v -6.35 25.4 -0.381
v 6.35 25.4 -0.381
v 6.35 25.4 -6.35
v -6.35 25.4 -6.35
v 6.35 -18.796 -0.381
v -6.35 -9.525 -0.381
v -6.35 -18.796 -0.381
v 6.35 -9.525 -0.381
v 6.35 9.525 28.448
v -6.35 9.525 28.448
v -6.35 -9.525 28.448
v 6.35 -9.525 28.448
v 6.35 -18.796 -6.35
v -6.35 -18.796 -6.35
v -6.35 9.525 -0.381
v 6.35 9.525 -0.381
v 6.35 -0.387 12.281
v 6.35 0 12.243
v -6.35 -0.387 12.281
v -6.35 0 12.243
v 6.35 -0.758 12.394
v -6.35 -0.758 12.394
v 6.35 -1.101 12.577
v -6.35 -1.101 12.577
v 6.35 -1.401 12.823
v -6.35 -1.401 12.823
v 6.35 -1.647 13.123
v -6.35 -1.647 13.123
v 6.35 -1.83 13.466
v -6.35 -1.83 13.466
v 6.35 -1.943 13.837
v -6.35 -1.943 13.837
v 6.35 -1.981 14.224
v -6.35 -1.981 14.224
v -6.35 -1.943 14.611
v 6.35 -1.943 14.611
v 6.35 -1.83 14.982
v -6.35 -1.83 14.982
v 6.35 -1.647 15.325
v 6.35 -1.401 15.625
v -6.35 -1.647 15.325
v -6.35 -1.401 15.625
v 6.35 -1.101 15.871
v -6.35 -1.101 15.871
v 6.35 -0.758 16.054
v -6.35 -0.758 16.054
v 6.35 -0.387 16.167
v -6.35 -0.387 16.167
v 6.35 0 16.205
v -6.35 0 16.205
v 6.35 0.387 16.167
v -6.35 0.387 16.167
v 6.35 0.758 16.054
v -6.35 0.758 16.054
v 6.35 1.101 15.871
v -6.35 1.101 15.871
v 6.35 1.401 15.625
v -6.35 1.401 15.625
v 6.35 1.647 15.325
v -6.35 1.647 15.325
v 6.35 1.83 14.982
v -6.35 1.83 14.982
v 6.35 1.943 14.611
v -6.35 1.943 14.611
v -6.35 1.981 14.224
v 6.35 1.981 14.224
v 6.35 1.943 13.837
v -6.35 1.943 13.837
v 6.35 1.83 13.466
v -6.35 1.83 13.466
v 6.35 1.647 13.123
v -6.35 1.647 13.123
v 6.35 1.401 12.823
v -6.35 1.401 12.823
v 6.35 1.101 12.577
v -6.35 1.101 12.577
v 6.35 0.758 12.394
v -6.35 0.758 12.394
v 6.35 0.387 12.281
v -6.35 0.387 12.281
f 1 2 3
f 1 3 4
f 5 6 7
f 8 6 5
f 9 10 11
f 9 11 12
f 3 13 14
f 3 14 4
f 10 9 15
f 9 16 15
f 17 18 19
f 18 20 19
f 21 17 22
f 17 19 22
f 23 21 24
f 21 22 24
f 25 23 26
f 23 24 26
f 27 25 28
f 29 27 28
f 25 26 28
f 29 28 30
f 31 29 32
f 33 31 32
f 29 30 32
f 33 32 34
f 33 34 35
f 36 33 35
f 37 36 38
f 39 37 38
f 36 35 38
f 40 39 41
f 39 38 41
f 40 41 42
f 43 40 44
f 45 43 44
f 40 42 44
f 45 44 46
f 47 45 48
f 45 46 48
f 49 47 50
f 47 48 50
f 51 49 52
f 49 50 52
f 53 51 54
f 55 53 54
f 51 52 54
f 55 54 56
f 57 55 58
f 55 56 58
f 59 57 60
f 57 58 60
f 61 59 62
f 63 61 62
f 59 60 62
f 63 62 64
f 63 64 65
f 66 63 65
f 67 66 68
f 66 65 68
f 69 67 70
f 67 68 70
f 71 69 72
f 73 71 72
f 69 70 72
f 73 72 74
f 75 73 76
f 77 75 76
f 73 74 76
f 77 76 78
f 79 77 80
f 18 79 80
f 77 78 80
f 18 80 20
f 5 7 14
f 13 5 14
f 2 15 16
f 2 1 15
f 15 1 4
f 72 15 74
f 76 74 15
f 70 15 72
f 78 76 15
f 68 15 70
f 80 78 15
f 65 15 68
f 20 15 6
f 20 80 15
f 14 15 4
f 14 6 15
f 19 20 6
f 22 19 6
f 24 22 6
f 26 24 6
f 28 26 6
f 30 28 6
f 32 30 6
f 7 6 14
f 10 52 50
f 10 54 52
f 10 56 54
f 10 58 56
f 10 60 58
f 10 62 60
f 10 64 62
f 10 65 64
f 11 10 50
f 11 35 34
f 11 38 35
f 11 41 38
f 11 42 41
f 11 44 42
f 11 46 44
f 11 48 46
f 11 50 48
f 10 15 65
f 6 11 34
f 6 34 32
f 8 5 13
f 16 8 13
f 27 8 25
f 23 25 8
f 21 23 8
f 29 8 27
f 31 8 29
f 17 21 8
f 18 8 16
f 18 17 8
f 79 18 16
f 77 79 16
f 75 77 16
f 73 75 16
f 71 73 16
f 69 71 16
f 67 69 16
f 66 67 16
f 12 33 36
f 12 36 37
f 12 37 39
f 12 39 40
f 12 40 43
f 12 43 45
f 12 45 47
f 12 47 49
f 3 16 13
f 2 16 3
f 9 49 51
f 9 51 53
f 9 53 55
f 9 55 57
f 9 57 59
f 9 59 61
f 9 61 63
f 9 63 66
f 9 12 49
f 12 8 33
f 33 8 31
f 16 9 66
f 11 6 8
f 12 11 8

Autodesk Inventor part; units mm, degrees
ref_plane "YZ Plane" through (0, 0, 0) normal (1, 0, 0) x (0, 1, 0)
ref_plane "XZ Plane" through (0, 0, 0) normal (0, 1, 0) x (-1, 0, 0)
ref_plane "XY Plane" through (0, 0, 0) normal (0, 0, 1) x (1, 0, 0)
sketch "Sketch1" plane through (0, 0, 0) normal (0, 0, 1) x (1, 0, 0)
  line L0 (-6.35, -25.4) -> (6.35, -25.4)
  line L1 (6.35, -25.4) -> (6.35, 25.4)
  line L2 (6.35, 25.4) -> (-6.35, 25.4)
  line L3 (-6.35, 25.4) -> (-6.35, -25.4)
  line L4 (-6.35, -25.4) -> (6.35, 25.4) construction
  line L5 (6.35, -25.4) -> (-6.35, 25.4) construction
  point P0 (0, 0)
  dimension "height" = 50.8
  dimension "width" = 12.7
extrude "Extrusion1" add sketch "Sketch1" against normal blind 12.7
sketch "Sketch3" plane through (0, 0, 0) normal (0, 0, 1) x (1, 0, 0)
  line L0 (-6.35, -9.525) -> (6.35, -9.525)
  line L1 (6.35, -9.525) -> (6.35, 9.525)
  line L2 (6.35, 9.525) -> (-6.35, 9.525)
  line L3 (-6.35, 9.525) -> (-6.35, -9.525)
  line L4 (-6.35, -9.525) -> (6.35, 9.525) construction
  line L5 (6.35, -9.525) -> (-6.35, 9.525) construction
  line L6 (6.35, 25.4) -> (-6.35, 25.4) projected
  point P0 (0, 0)
  dimension "Channel_Width" = 19.05
  dimension "d52" = 12.7
extrude "Extrusion3" add sketch "Sketch3" along normal blind 28.448
sketch "Sketch6" plane through (6.35, -25.4, -12.7) normal (1, 0, 0) x (0, 0, -1)
  line L0 (-12.7, 25.4) -> (-41.148, 25.4) construction
  line L1 (-41.148, 15.875) -> (-41.148, 34.925) construction
  line L2 (-12.7, 34.925) -> (-12.7, 50.8) construction
  point P0 (-26.924, 25.4)
  dimension "d53" = 14.224
hole "Hole5" at (6.35, 0, 14.224) direction (-1, 0, 0) diameter 3.9624 end through all thread size "10-32 UNF" class "2B" standard "ANSI Unified Screw Threads"
sketch "Sketch13" plane through (6.35, -25.4, -12.7) normal (1, 0, 0) x (0, 0, -1)
  line L0 (-12.7, 50.8) -> (0, 50.8) projected
  line L1 (0, 0) -> (-6.35, 0)
  line L2 (-6.35, 0) -> (-6.35, 50.8)
  line L3 (-6.35, 50.8) -> (0, 50.8)
  line L4 (0, 50.8) -> (0, 0)
  point P0 (-12.7, 25.4)
  dimension "d98" = 6.35
extrude "Extrusion5" cut sketch "Sketch13" against normal through all
sketch "Sketch14" plane through (-6.35, -25.4, 0) normal (-1, 0, 0) x (0, 0, 1)
  line L0 (0, 0) -> (-6.35, 0) projected
  line L1 (0, 0) -> (0, 15.875) projected
  line L2 (-6.35, 0) -> (0, 0)
  line L3 (0, 0) -> (0, 6.604)
  line L4 (0, 6.604) -> (-6.35, 6.604)
  line L5 (-6.35, 6.604) -> (-6.35, 0)
  point P0 (0, 25.4)
  dimension "d101" = 6.604
extrude "Extrusion6" cut sketch "Sketch14" against normal through all
sketch "Sketch16" plane through (6.35, 9.525, 0) normal (1, 0, 0) x (0, 0, -1)
  point P0 (0, -9.525)
sketch "Sketch17" plane through (0, 0, 0) normal (0, 0, 1) x (1, 0, 0)
  line L0 (-6.35, 25.4) -> (-6.35, 9.525) projected
  line L1 (-6.35, 9.525) -> (6.35, 9.525) projected
  line L2 (-6.35, 25.4) -> (6.35, 25.4)
  line L3 (6.35, 25.4) -> (6.35, 9.525)
  line L4 (6.35, 9.525) -> (-6.35, 9.525)
  line L5 (-6.35, 9.525) -> (-6.35, 25.4)
  point P0 (0, 0)
extrude "Extrusion7" cut sketch "Sketch17" against normal blind 0.381
sketch "Sketch18" plane through (0, 0, 0) normal (0, 0, 1) x (1, 0, 0)
  line L0 (-6.35, -18.796) -> (6.35, -18.796) projected
  line L1 (6.35, -9.525) -> (6.35, 9.525) projected
  line L2 (-6.35, -18.796) -> (6.35, -18.796)
  line L3 (6.35, -18.796) -> (6.35, -9.525)
  line L4 (6.35, -9.525) -> (-6.35, -9.525)
  line L5 (-6.35, -9.525) -> (-6.35, -18.796)
  point P0 (0, 0)
extrude "Extrusion8" cut sketch "Sketch18" against normal blind 0.381
sketch "Sketch10" plane through (0, 0, 28.448) normal (0, 0, 1) x (1, 0, 0)
  point P0 (0, 0)
sketch "Sketch12" plane through (-6.35, -9.525, 0) normal (0, -1, 0) x (1, 0, 0)
  point P0 (15.875, 15.875)
equation "\"width\" = partWidth"
equation "\"d52\" = width"
equation "\"Channel_Height\" = 2 * centerLineOfCylinder"
equation "\"d53\" = centerLineOfCylinder"
equation "\"partWidth\" = 12.7"
equation "\"centerLineOfCylinder\" = 14.224"
properties part number "vexTempConnectionToCylinder" material "Aluminum 6061"
